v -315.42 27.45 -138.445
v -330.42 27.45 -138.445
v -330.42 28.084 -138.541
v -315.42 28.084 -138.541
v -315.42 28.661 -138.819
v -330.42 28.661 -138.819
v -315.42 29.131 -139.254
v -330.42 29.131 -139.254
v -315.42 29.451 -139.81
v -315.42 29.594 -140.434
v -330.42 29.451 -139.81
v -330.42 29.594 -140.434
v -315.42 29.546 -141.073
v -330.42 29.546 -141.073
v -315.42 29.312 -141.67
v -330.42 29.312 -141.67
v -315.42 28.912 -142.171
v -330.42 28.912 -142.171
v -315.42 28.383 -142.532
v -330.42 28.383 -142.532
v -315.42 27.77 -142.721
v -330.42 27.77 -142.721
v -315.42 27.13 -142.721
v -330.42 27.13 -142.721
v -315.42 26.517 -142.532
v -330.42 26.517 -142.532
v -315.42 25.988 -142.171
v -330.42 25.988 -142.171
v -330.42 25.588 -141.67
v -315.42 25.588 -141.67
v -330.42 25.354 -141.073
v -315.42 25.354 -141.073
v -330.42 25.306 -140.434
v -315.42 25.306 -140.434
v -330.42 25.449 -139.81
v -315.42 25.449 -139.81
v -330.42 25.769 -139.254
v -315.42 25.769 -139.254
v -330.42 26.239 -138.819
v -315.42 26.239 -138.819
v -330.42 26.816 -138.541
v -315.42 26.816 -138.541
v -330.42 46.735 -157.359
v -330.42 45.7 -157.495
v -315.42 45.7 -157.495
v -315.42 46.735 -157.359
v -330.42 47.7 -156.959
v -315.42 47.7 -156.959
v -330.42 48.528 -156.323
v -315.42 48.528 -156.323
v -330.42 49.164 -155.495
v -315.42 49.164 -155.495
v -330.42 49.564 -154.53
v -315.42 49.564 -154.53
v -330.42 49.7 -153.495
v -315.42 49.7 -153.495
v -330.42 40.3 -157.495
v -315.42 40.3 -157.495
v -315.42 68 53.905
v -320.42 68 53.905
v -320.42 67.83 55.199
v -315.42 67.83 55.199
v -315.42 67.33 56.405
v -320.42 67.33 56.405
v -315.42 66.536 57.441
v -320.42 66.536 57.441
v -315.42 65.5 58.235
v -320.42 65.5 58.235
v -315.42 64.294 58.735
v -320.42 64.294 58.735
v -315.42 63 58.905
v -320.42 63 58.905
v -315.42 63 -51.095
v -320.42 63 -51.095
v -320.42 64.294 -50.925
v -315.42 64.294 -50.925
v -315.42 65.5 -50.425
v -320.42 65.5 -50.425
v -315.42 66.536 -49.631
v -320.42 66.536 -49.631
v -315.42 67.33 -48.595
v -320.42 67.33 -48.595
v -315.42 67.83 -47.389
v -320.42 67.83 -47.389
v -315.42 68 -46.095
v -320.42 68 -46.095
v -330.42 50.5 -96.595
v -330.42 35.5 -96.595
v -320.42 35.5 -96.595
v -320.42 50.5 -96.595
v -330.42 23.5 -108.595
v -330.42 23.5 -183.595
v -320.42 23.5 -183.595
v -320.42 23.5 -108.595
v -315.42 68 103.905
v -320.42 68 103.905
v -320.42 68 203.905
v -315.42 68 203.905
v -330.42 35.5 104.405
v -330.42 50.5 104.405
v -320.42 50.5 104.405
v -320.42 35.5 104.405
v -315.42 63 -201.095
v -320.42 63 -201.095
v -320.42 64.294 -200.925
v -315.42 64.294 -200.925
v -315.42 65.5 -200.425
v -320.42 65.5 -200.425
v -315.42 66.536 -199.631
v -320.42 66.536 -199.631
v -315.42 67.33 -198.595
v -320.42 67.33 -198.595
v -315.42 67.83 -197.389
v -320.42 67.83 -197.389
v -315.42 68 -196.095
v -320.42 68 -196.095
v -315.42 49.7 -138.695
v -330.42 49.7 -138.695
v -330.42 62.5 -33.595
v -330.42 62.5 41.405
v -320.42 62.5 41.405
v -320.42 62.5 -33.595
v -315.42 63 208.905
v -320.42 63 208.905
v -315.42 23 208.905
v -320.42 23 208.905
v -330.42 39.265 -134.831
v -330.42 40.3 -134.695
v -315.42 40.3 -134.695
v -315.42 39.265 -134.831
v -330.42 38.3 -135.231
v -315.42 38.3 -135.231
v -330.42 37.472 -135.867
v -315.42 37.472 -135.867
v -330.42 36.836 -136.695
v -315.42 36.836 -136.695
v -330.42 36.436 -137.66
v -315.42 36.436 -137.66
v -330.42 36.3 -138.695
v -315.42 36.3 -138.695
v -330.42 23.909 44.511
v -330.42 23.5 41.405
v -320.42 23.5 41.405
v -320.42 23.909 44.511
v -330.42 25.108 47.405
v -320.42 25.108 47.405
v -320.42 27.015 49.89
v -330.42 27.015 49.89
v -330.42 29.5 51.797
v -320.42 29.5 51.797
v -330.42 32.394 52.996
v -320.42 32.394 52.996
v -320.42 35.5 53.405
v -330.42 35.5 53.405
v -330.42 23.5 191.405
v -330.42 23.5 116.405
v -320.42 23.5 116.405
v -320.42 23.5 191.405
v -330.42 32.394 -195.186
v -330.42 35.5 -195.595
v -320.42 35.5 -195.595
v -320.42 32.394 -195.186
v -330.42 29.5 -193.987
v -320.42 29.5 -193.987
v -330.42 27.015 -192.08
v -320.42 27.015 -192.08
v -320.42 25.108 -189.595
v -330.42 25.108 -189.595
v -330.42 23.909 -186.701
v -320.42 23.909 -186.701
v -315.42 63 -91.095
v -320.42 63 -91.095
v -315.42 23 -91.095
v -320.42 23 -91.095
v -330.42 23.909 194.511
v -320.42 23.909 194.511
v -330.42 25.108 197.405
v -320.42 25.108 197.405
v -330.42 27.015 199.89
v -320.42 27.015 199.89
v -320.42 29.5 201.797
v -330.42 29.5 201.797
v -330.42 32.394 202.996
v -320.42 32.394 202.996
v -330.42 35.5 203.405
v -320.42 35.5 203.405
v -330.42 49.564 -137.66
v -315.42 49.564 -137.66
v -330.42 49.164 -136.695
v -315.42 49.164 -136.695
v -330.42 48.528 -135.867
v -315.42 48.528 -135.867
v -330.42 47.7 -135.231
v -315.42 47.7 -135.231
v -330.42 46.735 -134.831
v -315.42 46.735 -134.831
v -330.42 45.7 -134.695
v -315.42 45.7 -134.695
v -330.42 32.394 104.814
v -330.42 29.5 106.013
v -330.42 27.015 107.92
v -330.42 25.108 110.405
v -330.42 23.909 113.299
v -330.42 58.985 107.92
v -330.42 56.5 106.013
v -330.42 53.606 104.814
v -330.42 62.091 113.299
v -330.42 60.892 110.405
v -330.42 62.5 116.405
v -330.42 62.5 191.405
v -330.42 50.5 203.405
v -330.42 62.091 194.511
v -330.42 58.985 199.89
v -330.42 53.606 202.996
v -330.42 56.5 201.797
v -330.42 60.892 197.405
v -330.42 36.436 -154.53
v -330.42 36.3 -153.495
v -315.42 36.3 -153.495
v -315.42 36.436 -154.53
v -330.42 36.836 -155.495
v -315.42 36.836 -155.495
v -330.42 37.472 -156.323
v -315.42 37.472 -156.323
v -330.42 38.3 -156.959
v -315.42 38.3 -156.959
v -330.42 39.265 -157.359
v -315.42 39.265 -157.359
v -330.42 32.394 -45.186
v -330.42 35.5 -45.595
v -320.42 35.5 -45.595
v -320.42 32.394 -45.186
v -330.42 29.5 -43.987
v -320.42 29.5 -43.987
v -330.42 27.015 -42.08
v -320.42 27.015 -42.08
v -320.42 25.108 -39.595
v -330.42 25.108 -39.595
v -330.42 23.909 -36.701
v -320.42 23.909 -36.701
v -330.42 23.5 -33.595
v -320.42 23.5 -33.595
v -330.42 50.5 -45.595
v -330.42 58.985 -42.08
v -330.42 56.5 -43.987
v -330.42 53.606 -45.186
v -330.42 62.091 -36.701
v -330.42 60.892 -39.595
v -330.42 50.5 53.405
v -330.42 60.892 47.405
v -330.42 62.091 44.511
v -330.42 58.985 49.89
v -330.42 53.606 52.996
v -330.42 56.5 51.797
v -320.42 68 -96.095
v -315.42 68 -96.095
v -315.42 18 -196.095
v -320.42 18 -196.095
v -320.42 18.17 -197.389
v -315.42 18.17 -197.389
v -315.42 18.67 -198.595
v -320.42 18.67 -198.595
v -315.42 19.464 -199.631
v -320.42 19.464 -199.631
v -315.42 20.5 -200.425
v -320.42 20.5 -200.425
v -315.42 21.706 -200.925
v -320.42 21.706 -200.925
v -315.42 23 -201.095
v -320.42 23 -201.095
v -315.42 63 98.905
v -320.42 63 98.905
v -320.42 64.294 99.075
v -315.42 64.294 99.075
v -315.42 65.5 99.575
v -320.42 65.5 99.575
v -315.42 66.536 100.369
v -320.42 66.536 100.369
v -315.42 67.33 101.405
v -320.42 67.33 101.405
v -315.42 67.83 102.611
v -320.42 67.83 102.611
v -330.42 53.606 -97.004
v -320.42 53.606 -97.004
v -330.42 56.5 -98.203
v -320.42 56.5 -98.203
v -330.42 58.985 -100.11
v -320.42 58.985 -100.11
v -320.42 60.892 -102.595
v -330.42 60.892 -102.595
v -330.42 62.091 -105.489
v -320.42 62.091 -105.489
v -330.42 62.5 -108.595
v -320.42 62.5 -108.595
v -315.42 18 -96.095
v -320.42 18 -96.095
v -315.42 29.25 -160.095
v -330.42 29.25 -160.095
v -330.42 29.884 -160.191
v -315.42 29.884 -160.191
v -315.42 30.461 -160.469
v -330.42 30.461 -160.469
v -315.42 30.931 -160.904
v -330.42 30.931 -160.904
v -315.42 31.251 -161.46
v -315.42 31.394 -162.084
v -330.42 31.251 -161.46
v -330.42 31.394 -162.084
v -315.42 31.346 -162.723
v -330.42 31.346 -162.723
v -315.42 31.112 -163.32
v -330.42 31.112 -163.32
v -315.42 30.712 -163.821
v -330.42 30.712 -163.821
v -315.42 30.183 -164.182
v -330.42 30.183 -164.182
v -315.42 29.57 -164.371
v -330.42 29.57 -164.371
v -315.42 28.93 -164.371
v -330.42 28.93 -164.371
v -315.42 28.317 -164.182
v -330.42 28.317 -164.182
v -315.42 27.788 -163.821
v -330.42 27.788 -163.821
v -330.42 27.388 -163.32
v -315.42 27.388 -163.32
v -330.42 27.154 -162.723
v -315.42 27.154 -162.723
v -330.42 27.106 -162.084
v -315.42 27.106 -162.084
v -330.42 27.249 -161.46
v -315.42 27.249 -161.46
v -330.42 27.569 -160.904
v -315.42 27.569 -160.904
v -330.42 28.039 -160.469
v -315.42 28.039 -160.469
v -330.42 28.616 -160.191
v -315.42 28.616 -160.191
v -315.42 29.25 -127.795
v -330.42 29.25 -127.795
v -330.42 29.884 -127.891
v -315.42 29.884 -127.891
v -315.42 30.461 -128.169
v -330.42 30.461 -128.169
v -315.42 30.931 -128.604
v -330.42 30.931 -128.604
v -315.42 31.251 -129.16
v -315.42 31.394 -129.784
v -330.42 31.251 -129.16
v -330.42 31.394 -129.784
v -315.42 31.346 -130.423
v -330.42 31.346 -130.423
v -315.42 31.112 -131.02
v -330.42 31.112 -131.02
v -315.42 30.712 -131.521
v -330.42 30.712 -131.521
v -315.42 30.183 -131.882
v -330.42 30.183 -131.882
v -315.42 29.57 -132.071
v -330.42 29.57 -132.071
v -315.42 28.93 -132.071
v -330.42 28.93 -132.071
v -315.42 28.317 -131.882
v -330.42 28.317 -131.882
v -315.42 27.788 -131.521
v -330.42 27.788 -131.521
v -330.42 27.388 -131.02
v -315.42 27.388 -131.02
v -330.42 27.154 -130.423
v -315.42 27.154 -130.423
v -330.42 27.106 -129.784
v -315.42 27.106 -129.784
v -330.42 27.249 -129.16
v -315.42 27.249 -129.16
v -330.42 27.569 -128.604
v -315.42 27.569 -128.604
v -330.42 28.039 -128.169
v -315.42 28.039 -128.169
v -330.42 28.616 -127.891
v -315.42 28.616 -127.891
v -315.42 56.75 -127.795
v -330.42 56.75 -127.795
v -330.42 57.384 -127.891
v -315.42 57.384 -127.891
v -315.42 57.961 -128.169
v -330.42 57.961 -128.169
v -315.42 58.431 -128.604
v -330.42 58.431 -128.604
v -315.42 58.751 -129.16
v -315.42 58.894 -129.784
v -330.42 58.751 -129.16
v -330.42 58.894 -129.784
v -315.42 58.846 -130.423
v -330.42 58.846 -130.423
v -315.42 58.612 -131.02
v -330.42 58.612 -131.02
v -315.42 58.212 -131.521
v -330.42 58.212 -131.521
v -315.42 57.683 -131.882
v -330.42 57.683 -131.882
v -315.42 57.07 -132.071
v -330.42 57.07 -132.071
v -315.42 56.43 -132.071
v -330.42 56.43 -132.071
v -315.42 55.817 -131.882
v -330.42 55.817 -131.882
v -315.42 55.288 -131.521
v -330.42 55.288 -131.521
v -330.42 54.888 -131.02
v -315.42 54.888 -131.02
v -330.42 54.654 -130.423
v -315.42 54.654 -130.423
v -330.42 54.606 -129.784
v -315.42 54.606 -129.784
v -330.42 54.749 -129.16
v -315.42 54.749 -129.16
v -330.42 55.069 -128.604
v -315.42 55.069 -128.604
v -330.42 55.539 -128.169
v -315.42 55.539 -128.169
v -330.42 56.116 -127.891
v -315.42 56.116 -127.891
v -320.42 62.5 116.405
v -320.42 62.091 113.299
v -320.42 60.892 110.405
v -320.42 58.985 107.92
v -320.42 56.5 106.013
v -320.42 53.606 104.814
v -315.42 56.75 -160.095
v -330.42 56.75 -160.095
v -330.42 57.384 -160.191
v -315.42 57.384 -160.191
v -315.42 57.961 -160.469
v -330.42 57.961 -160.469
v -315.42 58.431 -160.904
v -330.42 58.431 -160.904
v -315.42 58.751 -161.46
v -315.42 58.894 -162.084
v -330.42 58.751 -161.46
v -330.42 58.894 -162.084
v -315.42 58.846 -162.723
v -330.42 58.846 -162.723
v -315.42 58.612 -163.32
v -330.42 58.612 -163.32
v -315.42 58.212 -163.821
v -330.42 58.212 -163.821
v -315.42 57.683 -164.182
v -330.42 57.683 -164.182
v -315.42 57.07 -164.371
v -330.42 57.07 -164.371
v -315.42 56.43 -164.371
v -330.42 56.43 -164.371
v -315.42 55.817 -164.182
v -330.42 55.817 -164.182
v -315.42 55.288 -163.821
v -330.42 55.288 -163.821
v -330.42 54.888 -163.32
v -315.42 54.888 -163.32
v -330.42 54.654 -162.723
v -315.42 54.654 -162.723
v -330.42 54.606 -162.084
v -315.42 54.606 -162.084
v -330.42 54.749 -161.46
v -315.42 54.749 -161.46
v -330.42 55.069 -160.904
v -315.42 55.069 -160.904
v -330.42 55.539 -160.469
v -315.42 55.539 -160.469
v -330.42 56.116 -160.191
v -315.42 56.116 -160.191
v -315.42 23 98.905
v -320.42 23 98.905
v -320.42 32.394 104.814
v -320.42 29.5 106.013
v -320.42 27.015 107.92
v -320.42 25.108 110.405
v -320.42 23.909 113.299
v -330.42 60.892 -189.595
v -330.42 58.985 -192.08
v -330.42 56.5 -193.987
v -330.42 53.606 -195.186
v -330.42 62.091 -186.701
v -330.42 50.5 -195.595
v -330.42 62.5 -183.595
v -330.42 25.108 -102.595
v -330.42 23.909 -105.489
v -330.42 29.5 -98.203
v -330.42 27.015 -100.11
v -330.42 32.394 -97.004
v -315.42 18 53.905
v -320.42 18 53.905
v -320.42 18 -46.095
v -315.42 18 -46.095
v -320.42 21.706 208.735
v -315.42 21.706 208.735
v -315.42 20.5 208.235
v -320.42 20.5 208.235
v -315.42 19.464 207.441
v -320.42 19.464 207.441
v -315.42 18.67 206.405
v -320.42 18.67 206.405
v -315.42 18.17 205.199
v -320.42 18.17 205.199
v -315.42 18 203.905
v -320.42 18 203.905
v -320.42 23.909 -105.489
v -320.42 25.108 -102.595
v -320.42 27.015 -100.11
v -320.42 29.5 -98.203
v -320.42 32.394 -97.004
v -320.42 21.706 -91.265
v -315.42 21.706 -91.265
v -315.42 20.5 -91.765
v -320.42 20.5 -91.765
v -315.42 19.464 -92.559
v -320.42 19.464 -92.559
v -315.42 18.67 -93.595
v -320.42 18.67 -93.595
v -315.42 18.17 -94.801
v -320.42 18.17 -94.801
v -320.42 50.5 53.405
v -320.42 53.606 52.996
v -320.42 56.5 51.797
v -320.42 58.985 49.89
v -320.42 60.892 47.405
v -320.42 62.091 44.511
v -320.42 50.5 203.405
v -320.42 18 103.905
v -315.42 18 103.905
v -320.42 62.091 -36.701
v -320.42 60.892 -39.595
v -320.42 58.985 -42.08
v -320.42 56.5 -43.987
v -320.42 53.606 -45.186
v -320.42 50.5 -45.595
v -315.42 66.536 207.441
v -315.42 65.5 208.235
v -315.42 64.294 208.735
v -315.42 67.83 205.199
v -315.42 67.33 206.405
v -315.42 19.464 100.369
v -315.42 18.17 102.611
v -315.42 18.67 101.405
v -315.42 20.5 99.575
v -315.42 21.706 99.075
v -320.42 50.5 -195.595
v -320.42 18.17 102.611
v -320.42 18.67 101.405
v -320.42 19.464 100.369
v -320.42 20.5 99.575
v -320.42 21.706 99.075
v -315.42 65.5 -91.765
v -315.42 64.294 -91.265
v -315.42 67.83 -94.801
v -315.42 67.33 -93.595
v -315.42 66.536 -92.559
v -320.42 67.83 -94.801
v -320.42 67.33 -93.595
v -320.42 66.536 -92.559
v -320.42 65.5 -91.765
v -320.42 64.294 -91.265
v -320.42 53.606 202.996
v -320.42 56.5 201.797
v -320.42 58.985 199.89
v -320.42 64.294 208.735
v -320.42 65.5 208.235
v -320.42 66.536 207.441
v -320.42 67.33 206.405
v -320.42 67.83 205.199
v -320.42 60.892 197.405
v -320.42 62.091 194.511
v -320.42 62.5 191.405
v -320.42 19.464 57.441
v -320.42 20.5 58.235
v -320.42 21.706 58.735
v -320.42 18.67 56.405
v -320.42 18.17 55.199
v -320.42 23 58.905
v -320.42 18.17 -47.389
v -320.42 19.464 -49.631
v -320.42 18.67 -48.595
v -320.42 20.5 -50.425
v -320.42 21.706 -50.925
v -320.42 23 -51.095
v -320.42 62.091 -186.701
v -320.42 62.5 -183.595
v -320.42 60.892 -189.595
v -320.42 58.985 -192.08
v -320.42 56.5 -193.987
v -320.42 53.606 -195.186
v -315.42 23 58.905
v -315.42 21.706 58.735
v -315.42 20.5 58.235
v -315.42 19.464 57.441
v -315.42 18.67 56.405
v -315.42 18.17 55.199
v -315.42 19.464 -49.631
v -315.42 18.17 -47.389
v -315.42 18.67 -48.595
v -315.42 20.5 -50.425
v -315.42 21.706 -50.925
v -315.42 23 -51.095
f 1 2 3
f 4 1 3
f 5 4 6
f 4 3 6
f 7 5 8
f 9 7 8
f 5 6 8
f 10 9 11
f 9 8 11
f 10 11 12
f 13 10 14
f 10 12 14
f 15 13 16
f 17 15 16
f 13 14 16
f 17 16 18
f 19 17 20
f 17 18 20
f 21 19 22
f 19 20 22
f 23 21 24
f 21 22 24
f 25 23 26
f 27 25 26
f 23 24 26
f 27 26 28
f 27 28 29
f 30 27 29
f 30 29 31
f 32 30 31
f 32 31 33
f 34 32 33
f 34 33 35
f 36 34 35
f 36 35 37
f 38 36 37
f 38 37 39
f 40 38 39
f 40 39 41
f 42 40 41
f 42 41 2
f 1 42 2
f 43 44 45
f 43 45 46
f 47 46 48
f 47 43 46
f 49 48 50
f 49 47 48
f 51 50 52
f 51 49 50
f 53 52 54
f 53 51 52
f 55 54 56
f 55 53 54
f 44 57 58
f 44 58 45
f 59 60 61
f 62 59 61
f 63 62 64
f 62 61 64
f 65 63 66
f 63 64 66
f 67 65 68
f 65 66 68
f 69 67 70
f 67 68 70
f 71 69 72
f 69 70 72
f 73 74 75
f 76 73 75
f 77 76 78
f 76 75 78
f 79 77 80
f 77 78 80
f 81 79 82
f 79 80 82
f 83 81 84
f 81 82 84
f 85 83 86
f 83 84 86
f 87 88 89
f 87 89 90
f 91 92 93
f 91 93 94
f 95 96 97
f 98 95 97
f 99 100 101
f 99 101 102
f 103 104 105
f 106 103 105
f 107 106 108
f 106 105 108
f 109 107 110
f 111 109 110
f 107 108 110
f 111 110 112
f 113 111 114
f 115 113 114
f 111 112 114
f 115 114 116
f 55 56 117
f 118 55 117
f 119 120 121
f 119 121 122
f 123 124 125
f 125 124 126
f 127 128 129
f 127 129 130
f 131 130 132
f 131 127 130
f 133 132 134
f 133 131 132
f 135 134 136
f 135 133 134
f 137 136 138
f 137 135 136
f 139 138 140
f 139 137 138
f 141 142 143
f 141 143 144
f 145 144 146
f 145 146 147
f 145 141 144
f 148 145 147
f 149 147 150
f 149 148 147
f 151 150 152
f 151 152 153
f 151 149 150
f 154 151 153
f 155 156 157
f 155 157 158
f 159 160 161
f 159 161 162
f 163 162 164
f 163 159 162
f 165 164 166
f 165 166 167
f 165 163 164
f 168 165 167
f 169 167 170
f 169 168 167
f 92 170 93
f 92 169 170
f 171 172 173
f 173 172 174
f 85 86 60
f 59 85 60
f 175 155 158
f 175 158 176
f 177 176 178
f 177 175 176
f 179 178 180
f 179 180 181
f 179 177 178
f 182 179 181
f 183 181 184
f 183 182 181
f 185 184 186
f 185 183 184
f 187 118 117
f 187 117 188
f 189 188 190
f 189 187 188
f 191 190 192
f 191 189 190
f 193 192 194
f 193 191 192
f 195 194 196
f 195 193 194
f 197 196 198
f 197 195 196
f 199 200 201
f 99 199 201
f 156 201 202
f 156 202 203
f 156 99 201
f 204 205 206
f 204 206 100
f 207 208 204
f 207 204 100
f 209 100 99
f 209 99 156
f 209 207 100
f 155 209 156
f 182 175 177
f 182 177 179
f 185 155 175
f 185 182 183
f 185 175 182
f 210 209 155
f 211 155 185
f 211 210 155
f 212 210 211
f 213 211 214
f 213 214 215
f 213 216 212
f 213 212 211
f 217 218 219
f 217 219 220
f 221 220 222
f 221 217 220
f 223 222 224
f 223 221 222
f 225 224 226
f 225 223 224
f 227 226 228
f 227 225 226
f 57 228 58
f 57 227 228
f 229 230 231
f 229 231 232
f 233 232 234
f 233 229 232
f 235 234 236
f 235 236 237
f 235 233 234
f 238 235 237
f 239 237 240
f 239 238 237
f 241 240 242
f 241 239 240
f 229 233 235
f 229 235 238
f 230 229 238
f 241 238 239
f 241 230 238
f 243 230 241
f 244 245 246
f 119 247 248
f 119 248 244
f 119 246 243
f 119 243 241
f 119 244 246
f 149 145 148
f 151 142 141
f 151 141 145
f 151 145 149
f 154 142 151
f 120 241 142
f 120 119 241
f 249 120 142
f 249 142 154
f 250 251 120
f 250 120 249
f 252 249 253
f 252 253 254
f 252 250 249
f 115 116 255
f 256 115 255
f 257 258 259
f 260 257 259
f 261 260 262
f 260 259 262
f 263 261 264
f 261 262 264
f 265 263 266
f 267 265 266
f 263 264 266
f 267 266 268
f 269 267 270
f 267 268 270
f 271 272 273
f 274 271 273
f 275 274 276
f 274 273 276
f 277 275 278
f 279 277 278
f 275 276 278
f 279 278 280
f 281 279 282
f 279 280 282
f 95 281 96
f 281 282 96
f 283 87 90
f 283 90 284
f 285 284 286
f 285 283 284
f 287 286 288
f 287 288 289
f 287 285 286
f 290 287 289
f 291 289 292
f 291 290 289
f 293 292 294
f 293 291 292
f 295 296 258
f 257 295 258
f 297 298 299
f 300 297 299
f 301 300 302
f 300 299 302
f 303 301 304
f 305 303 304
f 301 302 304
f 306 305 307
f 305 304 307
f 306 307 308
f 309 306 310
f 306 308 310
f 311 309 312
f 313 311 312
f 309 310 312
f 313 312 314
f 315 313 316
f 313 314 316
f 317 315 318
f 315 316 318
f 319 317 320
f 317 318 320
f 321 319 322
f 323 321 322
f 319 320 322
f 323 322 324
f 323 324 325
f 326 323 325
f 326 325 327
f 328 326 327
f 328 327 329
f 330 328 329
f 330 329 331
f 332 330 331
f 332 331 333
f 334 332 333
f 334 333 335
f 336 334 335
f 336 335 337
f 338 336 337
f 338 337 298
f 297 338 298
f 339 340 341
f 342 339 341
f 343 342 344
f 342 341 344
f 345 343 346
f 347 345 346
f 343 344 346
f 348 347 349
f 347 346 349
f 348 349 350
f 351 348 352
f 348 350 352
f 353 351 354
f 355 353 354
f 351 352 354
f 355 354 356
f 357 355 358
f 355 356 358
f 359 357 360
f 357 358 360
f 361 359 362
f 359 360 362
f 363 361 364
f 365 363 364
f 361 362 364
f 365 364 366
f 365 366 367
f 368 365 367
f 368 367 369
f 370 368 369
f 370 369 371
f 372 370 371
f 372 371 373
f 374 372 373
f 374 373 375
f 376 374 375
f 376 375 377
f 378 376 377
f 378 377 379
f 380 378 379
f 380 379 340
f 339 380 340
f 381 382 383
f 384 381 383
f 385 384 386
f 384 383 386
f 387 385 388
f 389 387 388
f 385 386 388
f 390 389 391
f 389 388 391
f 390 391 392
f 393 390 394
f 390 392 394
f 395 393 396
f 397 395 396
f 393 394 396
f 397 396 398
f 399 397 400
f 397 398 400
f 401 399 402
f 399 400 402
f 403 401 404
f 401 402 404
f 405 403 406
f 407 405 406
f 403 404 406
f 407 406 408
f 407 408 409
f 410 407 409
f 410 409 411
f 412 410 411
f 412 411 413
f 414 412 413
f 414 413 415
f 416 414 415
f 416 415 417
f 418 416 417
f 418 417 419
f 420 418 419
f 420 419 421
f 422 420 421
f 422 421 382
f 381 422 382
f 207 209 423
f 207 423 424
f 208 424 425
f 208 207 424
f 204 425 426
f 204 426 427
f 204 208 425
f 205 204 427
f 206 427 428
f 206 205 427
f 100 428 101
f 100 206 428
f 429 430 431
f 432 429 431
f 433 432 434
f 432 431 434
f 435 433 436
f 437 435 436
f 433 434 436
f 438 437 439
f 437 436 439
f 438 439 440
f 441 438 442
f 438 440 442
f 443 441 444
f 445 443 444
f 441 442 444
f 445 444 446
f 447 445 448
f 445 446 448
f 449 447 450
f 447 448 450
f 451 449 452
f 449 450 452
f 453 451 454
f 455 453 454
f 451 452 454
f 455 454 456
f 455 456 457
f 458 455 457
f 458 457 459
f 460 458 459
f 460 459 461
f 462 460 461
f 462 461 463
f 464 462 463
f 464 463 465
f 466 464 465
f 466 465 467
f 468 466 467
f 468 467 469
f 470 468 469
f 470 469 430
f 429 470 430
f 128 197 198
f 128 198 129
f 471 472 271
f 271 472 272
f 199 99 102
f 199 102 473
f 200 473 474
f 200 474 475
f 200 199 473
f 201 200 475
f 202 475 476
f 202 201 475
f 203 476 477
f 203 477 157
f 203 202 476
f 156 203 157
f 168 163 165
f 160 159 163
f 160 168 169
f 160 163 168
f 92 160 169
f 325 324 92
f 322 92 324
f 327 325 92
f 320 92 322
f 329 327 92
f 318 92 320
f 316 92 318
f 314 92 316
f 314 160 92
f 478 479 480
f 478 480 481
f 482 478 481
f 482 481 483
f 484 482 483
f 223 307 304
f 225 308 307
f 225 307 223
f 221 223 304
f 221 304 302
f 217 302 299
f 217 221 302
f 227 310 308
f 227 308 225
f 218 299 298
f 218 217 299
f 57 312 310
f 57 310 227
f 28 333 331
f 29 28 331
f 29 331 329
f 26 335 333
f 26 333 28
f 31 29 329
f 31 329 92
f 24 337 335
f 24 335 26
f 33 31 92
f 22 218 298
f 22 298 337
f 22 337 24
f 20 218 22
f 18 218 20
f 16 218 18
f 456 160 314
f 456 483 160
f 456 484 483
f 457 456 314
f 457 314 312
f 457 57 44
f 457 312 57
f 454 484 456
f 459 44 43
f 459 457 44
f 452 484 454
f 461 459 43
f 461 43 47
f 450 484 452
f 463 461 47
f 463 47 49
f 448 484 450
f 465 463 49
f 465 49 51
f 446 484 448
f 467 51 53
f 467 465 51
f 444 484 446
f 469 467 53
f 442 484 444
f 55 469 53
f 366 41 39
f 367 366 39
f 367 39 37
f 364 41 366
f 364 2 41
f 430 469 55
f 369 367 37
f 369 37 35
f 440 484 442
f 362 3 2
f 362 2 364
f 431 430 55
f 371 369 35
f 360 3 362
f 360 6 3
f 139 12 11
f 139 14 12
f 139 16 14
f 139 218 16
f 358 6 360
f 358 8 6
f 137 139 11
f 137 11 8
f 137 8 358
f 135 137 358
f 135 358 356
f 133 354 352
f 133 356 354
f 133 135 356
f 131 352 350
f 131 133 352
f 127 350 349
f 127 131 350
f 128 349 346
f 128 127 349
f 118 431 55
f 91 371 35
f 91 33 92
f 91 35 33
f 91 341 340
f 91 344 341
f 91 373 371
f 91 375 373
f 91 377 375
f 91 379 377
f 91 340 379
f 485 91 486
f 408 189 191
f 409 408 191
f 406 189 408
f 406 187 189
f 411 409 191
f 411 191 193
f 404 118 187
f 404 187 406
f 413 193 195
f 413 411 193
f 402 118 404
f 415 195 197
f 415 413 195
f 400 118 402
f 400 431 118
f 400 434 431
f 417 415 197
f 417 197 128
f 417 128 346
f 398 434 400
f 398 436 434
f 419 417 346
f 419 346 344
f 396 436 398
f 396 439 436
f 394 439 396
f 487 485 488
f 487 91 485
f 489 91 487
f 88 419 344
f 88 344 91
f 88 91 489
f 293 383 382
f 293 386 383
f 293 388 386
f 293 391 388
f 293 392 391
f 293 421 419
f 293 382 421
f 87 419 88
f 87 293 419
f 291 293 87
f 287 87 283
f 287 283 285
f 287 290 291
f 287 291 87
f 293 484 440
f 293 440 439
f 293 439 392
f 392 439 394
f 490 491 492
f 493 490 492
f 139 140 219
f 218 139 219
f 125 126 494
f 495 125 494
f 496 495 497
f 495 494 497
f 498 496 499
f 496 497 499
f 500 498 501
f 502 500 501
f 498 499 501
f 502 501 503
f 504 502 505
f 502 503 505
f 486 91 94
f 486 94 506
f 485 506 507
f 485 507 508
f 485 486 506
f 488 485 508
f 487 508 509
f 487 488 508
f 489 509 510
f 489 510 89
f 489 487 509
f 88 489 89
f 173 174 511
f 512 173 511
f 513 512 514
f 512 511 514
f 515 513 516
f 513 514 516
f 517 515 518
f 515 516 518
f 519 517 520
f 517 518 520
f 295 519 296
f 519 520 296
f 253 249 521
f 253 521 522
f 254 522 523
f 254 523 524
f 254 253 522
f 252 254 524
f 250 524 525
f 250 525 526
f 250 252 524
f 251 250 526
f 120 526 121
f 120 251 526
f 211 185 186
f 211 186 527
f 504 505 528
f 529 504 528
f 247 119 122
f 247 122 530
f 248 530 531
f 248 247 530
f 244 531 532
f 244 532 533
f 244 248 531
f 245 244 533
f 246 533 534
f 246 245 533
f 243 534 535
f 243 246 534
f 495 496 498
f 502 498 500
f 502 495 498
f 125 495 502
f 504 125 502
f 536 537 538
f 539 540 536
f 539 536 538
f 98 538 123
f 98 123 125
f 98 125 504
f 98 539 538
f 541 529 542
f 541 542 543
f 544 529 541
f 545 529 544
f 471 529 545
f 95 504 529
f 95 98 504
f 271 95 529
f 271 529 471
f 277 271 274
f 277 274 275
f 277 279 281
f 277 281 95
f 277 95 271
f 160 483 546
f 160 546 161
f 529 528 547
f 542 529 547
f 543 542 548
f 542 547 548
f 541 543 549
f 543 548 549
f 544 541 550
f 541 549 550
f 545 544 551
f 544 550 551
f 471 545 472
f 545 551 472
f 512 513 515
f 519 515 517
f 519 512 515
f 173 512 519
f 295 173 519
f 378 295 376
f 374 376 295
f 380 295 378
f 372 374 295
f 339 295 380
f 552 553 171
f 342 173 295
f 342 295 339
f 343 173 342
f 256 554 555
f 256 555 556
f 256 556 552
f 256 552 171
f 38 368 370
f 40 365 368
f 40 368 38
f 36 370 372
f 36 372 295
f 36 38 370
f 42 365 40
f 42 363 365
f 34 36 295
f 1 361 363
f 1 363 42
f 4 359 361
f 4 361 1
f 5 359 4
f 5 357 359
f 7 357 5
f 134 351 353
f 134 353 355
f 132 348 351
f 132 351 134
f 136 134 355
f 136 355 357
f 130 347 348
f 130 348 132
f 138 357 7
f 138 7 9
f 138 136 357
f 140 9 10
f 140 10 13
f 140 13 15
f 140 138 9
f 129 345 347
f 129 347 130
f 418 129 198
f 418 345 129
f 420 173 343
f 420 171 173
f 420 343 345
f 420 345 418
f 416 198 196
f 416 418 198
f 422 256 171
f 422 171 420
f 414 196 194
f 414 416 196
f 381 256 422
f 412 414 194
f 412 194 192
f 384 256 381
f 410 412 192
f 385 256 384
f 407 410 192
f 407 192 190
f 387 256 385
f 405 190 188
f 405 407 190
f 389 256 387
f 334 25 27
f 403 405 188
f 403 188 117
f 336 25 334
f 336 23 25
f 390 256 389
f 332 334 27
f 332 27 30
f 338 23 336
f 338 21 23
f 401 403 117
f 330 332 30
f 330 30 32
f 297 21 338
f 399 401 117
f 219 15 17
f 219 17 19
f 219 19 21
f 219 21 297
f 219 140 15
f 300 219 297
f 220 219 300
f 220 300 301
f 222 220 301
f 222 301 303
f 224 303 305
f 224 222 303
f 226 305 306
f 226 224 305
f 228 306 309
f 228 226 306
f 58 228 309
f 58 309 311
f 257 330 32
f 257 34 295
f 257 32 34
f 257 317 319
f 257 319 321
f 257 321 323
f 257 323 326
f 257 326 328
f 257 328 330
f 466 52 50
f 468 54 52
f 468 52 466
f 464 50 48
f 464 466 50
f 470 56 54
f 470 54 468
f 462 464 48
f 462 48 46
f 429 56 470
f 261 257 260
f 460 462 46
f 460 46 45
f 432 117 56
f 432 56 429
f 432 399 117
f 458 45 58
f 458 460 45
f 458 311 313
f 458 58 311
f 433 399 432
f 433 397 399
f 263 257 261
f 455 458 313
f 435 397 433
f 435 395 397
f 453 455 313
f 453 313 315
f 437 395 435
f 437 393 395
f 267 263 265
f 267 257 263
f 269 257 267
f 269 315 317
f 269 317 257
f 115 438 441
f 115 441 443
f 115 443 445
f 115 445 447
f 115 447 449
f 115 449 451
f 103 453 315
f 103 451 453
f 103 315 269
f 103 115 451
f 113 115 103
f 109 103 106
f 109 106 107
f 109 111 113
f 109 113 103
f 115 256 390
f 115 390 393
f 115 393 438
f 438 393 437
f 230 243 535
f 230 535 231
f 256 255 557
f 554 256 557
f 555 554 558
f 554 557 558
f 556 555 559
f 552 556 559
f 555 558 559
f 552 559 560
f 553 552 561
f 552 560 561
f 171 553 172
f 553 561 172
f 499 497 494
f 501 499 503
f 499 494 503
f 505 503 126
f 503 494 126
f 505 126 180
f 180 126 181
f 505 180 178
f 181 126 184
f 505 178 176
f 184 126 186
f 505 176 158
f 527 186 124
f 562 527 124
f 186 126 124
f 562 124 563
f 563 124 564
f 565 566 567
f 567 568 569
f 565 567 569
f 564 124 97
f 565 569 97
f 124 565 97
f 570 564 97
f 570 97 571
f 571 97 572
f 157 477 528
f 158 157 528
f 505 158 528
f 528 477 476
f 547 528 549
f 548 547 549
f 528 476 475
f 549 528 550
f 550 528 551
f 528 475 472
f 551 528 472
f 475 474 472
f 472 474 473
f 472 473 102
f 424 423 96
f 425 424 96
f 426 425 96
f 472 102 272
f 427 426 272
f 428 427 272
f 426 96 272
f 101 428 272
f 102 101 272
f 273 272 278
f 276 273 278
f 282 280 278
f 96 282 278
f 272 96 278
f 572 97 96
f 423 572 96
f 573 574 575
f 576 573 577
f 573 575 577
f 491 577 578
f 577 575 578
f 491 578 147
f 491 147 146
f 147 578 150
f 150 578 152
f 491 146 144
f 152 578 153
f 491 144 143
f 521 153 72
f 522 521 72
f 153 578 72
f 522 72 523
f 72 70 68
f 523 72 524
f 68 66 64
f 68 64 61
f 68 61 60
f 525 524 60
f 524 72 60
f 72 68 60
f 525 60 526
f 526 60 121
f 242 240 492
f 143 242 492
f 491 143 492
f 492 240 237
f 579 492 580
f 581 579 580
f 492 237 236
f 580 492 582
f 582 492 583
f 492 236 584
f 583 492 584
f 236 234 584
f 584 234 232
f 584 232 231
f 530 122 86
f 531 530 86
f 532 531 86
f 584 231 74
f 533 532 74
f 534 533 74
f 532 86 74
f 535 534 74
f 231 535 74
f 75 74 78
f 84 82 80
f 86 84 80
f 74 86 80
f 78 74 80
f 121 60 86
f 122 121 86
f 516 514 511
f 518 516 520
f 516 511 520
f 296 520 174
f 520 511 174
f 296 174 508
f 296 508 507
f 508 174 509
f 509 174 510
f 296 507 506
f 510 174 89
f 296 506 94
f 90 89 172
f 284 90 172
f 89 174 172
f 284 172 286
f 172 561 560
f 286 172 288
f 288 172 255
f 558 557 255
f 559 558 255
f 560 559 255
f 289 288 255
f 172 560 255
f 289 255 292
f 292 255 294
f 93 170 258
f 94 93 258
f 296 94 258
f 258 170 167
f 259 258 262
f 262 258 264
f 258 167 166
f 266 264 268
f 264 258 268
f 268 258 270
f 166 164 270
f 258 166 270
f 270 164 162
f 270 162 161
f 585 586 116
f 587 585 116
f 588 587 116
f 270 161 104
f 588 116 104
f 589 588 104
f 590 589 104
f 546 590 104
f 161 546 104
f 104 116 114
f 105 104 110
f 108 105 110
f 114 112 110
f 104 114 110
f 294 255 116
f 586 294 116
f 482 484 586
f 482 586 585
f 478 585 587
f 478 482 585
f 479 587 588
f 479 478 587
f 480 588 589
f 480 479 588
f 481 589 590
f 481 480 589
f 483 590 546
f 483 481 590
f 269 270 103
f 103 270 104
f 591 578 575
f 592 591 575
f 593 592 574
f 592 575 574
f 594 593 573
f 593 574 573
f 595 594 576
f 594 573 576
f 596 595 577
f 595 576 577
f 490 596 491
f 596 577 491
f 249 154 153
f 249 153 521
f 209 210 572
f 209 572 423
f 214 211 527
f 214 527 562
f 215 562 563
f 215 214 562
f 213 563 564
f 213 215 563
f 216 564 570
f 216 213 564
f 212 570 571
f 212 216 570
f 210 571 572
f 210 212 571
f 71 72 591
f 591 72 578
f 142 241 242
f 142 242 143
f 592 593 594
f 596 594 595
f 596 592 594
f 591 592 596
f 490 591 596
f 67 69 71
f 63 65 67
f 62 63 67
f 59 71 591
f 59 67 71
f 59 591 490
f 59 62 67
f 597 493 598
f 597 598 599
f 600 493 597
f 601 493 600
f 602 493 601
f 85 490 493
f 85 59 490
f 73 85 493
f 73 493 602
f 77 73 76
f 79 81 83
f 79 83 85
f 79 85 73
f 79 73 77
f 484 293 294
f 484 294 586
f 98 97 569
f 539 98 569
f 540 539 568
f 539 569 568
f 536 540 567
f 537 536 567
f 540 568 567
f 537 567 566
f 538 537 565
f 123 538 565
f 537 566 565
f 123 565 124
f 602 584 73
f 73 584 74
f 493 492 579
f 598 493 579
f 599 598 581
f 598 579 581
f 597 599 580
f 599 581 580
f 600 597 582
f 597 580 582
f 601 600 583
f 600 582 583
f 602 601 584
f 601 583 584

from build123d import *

# Parameters (mm, degrees)
BOSS_EXTRUDE1_DEPTH   = 10
BOSS_EXTRUDE1_2_DEPTH = 10
BOSS_EXTRUDE1_3_DEPTH = 10
BOSS_EXTRUDE2_DEPTH   = 5
SKETCH5_R             = 2.15
CUT_EXTRUDE3_DEPTH    = 221.205129425


with BuildPart() as part:
    # Sketch1 → Boss-Extrude1 (new body)
    with BuildSketch(Plane.ZY.offset(330.42)):
        with BuildLine():
            Line((53.405, 35.5), (53.405, 50.5))
            ThreePointArc((53.405, 50.5), (49.890281374, 58.985281374), (41.405, 62.5))
            Line((41.405, 62.5), (-33.595, 62.5))
            ThreePointArc((-33.595, 62.5), (-42.080281374, 58.985281374), (-45.595, 50.5))
            Line((-45.595, 50.5), (-45.595, 35.5))
            ThreePointArc((-45.595, 35.5), (-42.080281374, 27.014718626), (-33.595, 23.5))
            Line((-33.595, 23.5), (41.405, 23.5))
            ThreePointArc((41.405, 23.5), (49.890281374, 27.014718626), (53.405, 35.5))
        make_face()
    extrude(amount=-BOSS_EXTRUDE1_DEPTH)



with BuildPart() as body_2:
    # Sketch1 → Boss-Extrude1 2 (new body)
    with BuildSketch(Plane.ZY.offset(330.42)):
        with BuildLine():
            Line((-96.595, 35.5), (-96.595, 50.5))
            ThreePointArc((-96.595, 50.5), (-100.109718626, 58.985281374), (-108.595, 62.5))
            Line((-108.595, 62.5), (-183.595, 62.5))
            ThreePointArc((-183.595, 62.5), (-192.080281374, 58.985281374), (-195.595, 50.5))
            Line((-195.595, 50.5), (-195.595, 35.5))
            ThreePointArc((-195.595, 35.5), (-192.080281374, 27.014718626), (-183.595, 23.5))
            Line((-183.595, 23.5), (-108.595, 23.5))
            ThreePointArc((-108.595, 23.5), (-100.109718626, 27.014718626), (-96.595, 35.5))
        make_face()
    extrude(amount=-BOSS_EXTRUDE1_2_DEPTH)


with BuildPart() as body_3:
    # Sketch1 → Boss-Extrude1 3 (new body)
    with BuildSketch(Plane.ZY.offset(330.42)):
        with BuildLine():
            Line((203.405, 35.5), (203.405, 50.5))
            ThreePointArc((203.405, 50.5), (199.890281374, 58.985281374), (191.405, 62.5))
            Line((191.405, 62.5), (116.405, 62.5))
            ThreePointArc((116.405, 62.5), (107.919718626, 58.985281374), (104.405, 50.5))
            Line((104.405, 50.5), (104.405, 35.5))
            ThreePointArc((104.405, 35.5), (107.919718626, 27.014718626), (116.405, 23.5))
            Line((116.405, 23.5), (191.405, 23.5))
            ThreePointArc((191.405, 23.5), (199.890281374, 27.014718626), (203.405, 35.5))
        make_face()
    extrude(amount=-BOSS_EXTRUDE1_3_DEPTH)


with BuildPart() as part_1:
    add(part.part)

    add(body_2.part)  # Boss-Extrude2 merges body 2

    add(body_3.part)  # Boss-Extrude2 merges body 3
    # Sketch2 → Boss-Extrude2 (add)
    with BuildSketch(Plane(origin=(-320.42, 0, 0), x_dir=(0, 0, -1), z_dir=(1, 0, 0))):
        with BuildLine():
            Line((51.095, 23), (51.095, 63))
            ThreePointArc((51.095, 63), (49.630533906, 66.535533906), (46.095, 68))
            Line((46.095, 68), (-53.905, 68))
            ThreePointArc((-53.905, 68), (-57.440533906, 66.535533906), (-58.905, 63))
            Line((-58.905, 63), (-58.905, 23))
            ThreePointArc((-58.905, 23), (-57.440533906, 19.464466094), (-53.905, 18))
            Line((-53.905, 18), (46.095, 18))
            ThreePointArc((46.095, 18), (49.630533906, 19.464466094), (51.095, 23))
        make_face()
        with BuildLine():
            Line((201.095, 23), (201.095, 63))
            ThreePointArc((201.095, 63), (199.630533906, 66.535533906), (196.095, 68))
            Line((196.095, 68), (96.095, 68))
            ThreePointArc((96.095, 68), (92.559466094, 66.535533906), (91.095, 63))
            Line((91.095, 63), (91.095, 23))
            ThreePointArc((91.095, 23), (92.559466094, 19.464466094), (96.095, 18))
            Line((96.095, 18), (196.095, 18))
            ThreePointArc((196.095, 18), (199.630533906, 19.464466094), (201.095, 23))
        make_face()
        with BuildLine():
            Line((-98.905, 23), (-98.905, 63))
            ThreePointArc((-98.905, 63), (-100.369466094, 66.535533906), (-103.905, 68))
            Line((-103.905, 68), (-203.905, 68))
            ThreePointArc((-203.905, 68), (-207.440533906, 66.535533906), (-208.905, 63))
            Line((-208.905, 63), (-208.905, 23))
            ThreePointArc((-208.905, 23), (-207.440533906, 19.464466094), (-203.905, 18))
            Line((-203.905, 18), (-103.905, 18))
            ThreePointArc((-103.905, 18), (-100.369466094, 19.464466094), (-98.905, 23))
        make_face()
    extrude(amount=BOSS_EXTRUDE2_DEPTH)

    # Sketch5 → Cut-Extrude3 (cut, through all)
    with BuildSketch(Plane.ZY.offset(330.42)):
        with Locations((-162.245, 56.75)):
            Circle(SKETCH5_R)
        with Locations((-129.945, 56.75)):
            Circle(SKETCH5_R)
        with Locations((-129.945, 29.25)):
            Circle(SKETCH5_R)
        with Locations((-162.245, 29.25)):
            Circle(SKETCH5_R)
        with Locations((-140.595, 27.45)):
            Circle(SKETCH5_R)
        with BuildLine():
            Line((-153.495, 49.7), (-138.695, 49.7))
            ThreePointArc((-138.695, 49.7), (-135.866572875, 48.528427125), (-134.695, 45.7))
            Line((-134.695, 45.7), (-134.695, 40.3))
            ThreePointArc((-134.695, 40.3), (-135.866572875, 37.471572875), (-138.695, 36.3))
            Line((-138.695, 36.3), (-153.495, 36.3))
            ThreePointArc((-153.495, 36.3), (-156.323427125, 37.471572875), (-157.495, 40.3))
            Line((-157.495, 40.3), (-157.495, 45.7))
            ThreePointArc((-157.495, 45.7), (-156.323427125, 48.528427125), (-153.495, 49.7))
        make_face()
    extrude(amount=-CUT_EXTRUDE3_DEPTH, mode=Mode.SUBTRACT)


solid = part_1.part
